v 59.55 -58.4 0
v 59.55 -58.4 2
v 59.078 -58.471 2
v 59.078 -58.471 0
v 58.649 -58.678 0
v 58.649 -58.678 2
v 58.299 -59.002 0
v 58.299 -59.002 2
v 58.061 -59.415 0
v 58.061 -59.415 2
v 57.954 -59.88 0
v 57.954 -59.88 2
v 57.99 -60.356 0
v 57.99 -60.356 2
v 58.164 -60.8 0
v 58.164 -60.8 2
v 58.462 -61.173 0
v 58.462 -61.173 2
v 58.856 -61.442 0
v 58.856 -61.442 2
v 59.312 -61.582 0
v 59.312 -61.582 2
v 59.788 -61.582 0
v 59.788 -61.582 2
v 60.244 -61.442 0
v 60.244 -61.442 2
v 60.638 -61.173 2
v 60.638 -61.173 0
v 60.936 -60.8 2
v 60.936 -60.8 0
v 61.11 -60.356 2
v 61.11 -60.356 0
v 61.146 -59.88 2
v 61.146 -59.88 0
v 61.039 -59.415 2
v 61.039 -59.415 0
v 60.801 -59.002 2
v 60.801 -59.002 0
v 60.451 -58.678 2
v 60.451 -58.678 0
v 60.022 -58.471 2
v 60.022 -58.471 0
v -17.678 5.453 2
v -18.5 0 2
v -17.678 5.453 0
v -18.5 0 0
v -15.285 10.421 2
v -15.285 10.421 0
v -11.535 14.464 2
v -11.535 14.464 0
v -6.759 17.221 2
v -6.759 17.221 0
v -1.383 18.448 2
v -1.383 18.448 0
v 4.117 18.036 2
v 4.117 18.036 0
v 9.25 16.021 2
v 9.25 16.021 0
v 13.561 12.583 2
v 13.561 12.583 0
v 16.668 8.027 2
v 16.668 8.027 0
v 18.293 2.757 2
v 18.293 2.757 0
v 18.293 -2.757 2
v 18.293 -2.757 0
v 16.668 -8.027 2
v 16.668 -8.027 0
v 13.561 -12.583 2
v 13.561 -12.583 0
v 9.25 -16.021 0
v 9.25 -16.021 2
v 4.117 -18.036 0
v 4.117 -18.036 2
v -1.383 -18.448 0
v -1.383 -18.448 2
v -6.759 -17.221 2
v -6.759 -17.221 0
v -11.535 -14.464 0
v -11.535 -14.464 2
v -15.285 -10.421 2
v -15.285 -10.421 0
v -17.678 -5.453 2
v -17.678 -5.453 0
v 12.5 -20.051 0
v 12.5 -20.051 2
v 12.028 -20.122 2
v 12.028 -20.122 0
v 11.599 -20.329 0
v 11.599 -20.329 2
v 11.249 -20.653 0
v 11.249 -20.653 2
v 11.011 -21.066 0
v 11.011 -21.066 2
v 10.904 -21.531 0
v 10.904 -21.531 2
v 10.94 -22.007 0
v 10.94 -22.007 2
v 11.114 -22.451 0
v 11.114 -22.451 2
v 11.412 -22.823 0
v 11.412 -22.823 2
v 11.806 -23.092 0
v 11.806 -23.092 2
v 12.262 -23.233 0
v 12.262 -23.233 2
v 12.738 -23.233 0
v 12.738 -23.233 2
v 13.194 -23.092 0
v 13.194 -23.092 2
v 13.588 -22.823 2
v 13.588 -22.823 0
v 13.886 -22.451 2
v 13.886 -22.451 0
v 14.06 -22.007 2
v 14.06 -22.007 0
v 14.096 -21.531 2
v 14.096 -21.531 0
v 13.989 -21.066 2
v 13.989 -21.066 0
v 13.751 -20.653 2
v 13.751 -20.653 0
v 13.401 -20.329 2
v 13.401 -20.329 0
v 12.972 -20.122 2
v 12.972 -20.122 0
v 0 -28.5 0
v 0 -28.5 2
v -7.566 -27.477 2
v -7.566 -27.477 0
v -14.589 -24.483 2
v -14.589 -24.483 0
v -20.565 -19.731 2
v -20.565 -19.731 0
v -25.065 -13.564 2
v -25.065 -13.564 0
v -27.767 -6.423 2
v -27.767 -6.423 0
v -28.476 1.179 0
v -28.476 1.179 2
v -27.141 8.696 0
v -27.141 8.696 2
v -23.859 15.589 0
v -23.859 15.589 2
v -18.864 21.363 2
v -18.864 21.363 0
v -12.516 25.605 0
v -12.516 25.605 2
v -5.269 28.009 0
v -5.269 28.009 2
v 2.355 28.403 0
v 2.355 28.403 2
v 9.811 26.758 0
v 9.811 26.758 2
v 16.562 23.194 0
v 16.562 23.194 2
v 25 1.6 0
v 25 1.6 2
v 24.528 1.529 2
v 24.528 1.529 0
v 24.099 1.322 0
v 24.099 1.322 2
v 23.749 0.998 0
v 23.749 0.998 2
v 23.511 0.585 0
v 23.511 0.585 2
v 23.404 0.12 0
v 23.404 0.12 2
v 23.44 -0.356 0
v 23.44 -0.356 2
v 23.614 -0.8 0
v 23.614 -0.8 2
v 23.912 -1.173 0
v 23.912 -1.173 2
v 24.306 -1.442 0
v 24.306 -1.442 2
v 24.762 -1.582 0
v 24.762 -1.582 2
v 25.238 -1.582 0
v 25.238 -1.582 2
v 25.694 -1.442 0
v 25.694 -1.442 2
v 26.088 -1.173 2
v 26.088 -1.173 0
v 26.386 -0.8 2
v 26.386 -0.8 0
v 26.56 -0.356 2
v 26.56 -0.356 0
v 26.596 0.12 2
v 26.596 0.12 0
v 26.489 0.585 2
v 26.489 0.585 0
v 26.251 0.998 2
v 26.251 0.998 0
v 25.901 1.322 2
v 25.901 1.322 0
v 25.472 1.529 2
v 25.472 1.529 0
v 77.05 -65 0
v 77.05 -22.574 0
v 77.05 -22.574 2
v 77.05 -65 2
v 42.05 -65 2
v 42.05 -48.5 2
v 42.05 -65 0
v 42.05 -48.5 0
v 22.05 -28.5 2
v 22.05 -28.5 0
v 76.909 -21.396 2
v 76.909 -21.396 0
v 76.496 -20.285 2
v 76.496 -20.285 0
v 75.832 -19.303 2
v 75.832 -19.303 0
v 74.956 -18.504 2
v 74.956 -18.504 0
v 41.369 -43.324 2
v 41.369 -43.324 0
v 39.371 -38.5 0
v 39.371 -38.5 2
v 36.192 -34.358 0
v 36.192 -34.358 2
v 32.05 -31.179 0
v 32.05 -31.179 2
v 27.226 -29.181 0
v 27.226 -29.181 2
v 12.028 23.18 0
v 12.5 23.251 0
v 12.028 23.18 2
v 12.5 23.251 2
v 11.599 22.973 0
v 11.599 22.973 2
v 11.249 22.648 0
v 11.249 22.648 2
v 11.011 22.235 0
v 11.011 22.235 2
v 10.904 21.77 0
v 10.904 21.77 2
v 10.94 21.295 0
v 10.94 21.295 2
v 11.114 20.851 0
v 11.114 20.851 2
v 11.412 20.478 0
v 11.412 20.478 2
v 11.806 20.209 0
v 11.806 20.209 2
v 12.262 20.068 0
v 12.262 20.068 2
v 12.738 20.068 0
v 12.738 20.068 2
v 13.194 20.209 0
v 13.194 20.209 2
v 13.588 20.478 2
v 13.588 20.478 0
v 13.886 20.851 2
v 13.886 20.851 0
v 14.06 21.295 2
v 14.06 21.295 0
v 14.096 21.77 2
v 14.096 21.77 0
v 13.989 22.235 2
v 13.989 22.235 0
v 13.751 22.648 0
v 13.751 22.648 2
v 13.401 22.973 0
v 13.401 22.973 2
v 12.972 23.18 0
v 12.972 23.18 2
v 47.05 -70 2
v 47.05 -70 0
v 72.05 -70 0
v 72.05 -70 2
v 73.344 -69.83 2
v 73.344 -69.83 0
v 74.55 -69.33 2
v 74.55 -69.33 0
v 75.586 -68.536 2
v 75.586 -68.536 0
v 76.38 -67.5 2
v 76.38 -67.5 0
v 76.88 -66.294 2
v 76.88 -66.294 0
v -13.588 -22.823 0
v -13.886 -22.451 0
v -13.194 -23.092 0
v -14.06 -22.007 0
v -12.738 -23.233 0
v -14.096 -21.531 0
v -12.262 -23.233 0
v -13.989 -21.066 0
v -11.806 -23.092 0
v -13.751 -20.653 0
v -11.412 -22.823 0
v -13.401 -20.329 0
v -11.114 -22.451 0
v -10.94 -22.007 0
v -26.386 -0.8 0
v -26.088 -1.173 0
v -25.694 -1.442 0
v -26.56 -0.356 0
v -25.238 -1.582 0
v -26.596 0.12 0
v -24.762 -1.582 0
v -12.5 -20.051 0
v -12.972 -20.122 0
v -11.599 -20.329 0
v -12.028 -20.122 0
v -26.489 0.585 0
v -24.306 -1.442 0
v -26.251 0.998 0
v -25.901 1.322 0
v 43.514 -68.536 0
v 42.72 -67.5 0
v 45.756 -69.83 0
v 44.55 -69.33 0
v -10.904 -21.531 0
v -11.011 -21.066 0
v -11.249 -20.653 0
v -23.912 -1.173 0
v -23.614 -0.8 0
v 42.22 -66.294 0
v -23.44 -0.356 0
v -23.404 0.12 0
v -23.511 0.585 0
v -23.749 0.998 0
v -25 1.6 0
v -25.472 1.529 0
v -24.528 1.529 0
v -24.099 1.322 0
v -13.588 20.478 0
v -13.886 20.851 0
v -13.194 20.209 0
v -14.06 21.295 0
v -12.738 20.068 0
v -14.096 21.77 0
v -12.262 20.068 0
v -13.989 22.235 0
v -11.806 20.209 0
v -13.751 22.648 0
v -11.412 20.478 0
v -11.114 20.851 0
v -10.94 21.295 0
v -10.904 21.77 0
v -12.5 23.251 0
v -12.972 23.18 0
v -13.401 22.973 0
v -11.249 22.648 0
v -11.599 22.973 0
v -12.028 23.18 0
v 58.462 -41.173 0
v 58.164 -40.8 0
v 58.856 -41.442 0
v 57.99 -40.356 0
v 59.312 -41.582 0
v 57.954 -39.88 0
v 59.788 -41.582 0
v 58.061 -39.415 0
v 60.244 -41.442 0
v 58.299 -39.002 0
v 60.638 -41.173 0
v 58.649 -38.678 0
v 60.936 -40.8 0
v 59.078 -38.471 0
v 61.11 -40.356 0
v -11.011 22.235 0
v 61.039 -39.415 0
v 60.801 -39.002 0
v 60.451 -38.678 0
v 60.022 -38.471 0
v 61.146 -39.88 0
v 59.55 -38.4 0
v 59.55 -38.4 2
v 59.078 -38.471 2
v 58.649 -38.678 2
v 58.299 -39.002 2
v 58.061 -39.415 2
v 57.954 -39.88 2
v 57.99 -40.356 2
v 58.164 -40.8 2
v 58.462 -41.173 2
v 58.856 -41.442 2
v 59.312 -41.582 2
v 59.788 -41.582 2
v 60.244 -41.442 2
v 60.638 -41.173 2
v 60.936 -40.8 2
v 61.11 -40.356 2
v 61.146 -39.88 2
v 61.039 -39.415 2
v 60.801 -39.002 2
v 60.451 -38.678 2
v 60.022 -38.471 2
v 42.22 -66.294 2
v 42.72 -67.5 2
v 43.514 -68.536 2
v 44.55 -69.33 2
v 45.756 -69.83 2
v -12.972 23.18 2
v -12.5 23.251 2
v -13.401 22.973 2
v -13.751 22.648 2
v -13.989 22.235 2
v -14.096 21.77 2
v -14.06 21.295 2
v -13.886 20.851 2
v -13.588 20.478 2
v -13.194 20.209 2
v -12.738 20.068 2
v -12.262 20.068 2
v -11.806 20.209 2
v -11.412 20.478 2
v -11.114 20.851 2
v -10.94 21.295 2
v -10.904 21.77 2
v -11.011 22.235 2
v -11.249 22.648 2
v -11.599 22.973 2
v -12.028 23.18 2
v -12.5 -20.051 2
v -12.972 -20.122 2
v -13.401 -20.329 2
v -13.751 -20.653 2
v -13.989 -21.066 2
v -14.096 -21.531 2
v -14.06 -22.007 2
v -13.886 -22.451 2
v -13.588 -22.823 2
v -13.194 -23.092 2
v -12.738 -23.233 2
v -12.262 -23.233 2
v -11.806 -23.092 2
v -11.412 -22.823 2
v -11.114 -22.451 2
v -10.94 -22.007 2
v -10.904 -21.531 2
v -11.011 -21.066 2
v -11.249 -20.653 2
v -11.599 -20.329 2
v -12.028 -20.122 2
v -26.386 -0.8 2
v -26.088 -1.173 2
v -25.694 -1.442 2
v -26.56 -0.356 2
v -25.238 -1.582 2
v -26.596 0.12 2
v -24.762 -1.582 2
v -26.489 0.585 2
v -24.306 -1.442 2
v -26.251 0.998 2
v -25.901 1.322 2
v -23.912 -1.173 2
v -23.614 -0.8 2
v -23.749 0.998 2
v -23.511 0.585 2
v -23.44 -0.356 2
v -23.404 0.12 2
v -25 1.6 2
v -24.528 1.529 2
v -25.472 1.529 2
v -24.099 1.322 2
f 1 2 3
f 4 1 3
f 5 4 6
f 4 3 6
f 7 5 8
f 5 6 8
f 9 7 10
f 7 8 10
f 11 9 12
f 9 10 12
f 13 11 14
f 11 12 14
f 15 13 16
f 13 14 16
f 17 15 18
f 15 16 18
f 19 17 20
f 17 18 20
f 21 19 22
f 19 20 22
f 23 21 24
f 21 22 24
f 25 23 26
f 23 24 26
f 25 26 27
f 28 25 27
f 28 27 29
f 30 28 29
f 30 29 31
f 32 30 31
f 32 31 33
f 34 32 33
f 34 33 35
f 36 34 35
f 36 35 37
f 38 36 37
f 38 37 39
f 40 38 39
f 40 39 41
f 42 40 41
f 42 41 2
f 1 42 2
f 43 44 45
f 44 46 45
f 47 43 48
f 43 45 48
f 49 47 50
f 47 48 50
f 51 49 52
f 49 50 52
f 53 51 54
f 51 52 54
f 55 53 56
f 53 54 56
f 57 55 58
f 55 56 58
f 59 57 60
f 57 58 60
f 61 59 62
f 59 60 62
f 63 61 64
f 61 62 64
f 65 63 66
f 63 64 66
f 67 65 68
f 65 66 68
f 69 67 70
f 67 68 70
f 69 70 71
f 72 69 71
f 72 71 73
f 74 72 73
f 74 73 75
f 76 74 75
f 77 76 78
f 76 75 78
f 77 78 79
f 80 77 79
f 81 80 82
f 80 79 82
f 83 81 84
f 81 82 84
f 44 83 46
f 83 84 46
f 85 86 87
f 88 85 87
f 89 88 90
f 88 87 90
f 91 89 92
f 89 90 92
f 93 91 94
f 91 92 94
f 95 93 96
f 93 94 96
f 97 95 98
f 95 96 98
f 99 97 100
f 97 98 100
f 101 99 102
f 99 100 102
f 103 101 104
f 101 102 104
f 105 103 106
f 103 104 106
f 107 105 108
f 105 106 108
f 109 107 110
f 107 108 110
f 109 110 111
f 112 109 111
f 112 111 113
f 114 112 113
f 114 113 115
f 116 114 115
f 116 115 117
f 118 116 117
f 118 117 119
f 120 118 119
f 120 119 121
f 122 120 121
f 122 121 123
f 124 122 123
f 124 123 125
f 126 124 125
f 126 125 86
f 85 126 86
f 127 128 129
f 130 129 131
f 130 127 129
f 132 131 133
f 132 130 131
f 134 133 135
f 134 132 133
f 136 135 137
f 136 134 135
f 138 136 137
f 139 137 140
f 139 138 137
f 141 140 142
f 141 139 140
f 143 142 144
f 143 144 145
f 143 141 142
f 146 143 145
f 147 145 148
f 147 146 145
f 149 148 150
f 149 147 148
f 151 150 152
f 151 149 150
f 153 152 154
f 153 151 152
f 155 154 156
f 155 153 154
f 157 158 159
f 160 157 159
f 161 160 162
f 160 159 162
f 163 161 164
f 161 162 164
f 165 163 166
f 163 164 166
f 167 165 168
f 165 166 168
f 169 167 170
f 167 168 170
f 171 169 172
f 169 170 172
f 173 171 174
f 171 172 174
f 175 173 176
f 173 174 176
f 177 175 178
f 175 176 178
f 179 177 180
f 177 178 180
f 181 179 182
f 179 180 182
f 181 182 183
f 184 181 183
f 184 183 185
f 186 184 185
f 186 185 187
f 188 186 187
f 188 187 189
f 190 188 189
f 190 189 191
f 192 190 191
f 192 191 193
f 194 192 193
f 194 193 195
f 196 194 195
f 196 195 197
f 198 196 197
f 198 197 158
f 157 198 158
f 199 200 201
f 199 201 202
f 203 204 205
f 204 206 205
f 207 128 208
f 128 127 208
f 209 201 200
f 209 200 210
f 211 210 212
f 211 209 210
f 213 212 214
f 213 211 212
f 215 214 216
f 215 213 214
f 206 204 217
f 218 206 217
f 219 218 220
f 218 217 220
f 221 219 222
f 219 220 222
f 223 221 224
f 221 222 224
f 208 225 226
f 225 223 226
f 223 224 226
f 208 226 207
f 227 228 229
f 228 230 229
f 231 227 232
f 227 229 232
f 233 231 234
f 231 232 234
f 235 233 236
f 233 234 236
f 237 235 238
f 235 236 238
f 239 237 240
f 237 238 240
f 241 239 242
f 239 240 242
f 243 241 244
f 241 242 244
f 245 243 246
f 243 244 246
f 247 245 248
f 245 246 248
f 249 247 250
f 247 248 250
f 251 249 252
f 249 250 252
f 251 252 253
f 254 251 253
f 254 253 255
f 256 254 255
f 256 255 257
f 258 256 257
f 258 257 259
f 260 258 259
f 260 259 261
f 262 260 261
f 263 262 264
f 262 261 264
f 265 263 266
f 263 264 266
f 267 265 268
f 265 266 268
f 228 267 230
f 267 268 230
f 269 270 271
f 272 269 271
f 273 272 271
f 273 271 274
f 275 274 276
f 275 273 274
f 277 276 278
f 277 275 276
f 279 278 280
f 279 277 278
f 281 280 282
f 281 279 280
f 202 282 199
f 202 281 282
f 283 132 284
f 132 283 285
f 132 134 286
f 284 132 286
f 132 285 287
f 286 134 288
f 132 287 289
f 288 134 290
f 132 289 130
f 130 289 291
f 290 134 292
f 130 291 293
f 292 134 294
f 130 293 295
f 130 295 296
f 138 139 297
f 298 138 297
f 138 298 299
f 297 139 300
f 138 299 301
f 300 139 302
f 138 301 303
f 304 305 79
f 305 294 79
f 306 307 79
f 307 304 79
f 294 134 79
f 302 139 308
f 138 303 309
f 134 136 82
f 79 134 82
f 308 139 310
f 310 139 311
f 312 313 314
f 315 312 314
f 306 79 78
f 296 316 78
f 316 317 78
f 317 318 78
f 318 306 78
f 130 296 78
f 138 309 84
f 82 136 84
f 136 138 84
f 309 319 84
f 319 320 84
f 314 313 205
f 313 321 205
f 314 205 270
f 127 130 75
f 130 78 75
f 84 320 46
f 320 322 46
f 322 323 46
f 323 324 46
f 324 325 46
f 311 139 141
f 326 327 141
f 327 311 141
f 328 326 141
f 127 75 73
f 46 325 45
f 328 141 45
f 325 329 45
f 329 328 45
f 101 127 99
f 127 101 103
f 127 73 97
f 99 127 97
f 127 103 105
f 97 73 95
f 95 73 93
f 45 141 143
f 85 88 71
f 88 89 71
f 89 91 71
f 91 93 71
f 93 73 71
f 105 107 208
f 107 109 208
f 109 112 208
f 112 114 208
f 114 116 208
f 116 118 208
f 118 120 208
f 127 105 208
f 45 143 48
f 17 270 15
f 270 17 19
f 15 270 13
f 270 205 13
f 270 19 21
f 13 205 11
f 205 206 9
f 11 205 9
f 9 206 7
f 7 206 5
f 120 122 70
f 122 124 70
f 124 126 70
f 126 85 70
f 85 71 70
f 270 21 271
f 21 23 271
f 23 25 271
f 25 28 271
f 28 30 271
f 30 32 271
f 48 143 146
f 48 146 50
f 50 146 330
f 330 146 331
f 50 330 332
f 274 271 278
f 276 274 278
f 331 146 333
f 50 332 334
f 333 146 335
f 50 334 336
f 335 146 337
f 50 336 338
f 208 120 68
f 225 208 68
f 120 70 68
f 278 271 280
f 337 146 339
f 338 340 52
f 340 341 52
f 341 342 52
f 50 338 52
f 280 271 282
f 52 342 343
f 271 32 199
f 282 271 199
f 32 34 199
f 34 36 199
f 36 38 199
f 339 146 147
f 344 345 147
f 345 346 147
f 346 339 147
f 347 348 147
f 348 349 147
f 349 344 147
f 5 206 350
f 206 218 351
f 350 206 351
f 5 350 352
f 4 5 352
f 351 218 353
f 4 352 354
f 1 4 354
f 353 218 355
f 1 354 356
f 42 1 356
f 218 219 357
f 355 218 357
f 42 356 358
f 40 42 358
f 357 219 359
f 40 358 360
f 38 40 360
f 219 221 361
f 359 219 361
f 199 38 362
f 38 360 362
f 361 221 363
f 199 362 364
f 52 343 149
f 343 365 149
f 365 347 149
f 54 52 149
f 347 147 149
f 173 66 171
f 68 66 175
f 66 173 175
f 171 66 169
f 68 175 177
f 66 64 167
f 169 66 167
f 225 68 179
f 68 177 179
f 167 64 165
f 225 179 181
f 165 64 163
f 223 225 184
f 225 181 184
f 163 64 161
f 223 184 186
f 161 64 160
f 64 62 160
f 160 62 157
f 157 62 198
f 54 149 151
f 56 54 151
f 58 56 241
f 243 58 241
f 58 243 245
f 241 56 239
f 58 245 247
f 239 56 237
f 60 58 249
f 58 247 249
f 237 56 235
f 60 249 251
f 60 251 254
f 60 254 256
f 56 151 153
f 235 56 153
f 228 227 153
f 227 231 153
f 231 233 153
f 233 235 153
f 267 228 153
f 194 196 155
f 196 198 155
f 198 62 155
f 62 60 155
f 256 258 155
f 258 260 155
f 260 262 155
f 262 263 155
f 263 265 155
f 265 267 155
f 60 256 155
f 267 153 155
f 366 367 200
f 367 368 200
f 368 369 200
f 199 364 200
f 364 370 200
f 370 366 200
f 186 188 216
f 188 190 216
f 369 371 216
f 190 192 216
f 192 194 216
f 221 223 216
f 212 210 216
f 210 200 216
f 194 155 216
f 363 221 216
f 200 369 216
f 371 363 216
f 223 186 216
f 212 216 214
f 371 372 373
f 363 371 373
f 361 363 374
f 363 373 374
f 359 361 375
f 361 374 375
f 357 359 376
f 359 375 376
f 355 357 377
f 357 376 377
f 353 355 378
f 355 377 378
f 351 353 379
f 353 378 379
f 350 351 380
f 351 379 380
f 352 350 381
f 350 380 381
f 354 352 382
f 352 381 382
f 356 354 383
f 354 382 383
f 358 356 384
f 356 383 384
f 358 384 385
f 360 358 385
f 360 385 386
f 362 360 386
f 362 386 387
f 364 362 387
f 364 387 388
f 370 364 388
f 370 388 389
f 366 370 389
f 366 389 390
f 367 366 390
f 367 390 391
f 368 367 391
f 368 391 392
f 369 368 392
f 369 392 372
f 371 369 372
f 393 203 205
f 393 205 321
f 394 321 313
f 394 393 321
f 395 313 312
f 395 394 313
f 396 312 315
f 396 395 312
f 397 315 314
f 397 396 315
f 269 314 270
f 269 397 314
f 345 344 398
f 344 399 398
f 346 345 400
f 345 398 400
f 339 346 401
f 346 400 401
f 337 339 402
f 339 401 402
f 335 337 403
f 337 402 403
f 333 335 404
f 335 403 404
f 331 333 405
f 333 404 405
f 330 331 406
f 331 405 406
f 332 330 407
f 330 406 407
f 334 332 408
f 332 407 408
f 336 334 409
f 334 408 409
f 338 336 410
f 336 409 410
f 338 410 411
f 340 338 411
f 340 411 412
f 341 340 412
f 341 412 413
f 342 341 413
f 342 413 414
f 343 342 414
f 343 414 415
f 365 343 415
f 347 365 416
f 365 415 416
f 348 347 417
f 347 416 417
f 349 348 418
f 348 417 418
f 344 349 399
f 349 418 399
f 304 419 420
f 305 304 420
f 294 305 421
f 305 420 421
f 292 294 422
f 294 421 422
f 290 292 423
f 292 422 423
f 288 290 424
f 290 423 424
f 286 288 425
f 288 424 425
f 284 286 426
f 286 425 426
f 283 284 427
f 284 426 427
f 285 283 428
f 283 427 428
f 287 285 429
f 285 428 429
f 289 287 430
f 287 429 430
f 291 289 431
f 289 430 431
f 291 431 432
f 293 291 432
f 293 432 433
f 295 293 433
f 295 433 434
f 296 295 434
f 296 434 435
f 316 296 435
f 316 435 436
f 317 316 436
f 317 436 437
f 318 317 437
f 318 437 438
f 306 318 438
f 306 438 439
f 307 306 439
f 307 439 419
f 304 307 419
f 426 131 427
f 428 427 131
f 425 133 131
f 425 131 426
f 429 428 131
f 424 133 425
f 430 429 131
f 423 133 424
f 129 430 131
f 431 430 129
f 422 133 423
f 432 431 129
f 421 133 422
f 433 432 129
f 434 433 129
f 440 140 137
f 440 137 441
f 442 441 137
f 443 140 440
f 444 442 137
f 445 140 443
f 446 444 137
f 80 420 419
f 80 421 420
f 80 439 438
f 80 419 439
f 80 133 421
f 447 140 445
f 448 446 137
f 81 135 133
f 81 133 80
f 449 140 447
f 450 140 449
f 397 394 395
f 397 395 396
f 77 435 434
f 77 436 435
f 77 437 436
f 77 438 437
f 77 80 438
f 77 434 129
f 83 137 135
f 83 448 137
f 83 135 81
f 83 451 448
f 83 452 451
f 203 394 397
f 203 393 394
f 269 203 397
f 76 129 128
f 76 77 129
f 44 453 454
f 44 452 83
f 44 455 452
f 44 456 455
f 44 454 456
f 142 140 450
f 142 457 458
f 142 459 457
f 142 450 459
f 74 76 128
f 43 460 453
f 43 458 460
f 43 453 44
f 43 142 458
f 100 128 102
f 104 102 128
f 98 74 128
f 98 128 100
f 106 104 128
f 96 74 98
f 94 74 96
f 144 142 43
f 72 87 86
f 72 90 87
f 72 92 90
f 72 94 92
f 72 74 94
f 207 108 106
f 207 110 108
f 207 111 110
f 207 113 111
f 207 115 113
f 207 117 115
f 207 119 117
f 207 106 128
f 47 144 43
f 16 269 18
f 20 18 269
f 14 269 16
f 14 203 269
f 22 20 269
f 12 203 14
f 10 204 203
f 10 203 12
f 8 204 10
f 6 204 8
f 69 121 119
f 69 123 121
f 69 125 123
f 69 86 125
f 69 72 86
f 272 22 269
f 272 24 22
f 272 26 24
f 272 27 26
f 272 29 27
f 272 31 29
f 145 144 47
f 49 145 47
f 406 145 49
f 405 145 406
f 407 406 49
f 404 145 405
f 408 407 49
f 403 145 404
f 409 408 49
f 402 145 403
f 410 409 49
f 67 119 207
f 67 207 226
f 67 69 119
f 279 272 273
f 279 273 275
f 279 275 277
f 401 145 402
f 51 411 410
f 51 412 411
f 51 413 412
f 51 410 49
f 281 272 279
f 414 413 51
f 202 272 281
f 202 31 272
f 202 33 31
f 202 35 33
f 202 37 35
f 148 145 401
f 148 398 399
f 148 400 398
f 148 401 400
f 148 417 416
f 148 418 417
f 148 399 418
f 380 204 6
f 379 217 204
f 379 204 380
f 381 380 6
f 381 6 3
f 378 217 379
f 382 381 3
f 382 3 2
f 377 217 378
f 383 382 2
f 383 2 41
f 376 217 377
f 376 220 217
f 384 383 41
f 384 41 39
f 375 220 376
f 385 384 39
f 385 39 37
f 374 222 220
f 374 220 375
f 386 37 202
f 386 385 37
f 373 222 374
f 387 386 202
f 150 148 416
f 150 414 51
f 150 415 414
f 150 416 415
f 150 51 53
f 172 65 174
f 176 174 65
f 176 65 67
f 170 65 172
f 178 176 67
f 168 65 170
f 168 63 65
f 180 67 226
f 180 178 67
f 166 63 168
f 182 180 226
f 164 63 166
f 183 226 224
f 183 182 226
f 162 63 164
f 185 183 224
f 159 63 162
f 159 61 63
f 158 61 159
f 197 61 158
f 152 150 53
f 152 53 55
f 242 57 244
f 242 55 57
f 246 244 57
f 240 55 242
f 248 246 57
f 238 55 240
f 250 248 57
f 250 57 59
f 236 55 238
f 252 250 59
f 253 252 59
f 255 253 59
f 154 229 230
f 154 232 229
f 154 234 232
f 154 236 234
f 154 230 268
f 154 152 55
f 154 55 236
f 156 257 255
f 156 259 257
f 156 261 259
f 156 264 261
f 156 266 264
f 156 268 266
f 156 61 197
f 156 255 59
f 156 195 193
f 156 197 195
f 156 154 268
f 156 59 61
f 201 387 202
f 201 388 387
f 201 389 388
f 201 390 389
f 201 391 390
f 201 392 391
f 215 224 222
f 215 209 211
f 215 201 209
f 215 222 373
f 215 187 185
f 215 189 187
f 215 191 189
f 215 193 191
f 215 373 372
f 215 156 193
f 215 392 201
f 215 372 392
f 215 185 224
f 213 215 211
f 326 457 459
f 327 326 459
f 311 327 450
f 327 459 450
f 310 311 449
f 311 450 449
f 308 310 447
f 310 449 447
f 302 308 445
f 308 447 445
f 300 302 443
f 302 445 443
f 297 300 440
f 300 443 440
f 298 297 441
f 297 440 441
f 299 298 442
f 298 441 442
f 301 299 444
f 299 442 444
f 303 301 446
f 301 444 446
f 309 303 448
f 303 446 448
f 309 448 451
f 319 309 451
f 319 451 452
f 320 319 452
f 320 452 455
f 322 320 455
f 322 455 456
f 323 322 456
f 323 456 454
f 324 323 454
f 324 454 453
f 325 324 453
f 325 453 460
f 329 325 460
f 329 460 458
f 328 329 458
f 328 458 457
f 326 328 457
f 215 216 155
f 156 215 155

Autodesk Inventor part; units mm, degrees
ref_plane "YZ Plane" through (0, 0, 0) normal (1, 0, 0) x (0, 1, 0)
ref_plane "XZ Plane" through (0, 0, 0) normal (0, 1, 0) x (-1, 0, 0)
ref_plane "XY Plane" through (0, 0, 0) normal (0, 0, 1) x (1, 0, 0)
sketch "スケッチ1" plane through (0, 0, 0) normal (0, 0, 1) x (1, 0, 0)
  circle A0 centre (0, 0) radius 28.5
  line L0 (0, 0) -> (59.55, 0)
  line L1 (59.55, 0) -> (42.05, 0)
  line L2 (42.05, 0) -> (42.05, -70)
  line L3 (42.05, -70) -> (59.55, -70)
  line L4 (59.55, -70) -> (59.55, 0)
  line L5 (77.05, 0) -> (77.05, -70)
  line L6 (77.05, -70) -> (59.55, -70)
  line L7 (77.05, 0) -> (59.55, 0)
  line L8 (42.05, -70) -> (-17.7725, -22.2798)
  line L9 (77.05, -20) -> (42.05, -20)
  line L10 (77.05, -20) -> (16.5623, 23.1936)
  point P0 (42.05, 0)
  point P1 (28.5, 0)
  dimension "d0" = 57
  dimension "d1" = 59.55
  dimension "d2" = 17.5
  dimension "d3" = 70
  dimension "d31" = 50
extrude "押し出し1" add sketch "スケッチ1" along normal blind 2 contours A0 | L0 L2 L8 A0 | A0 L10 L0 | L0 L10 L4 L9 L2 | L2 L9 L4 L3 | L10 L9 L4 | L4 L9 L5 L6
sketch "スケッチ2" plane through (0, 0, 0) normal (0, 0, -1) x (-1, 0, 0)
  circle A0 centre (0, 0) radius 18.5
  dimension "d6" = 37
extrude "押し出し2" cut sketch "スケッチ2" against normal blind 2
sketch "スケッチ3" plane through (0, 0, 0) normal (0, 0, -1) x (-1, 0, 0)
  arc A0 (17.7725, -22.2798) -> (-16.5623, 23.1936) centre (0, 0) ccw projected
  circle A1 centre (0, 0) radius 25
  line L0 (0, 0) -> (0, 28.5)
  line L1 (0, 0) -> (12.5, 21.6506)
  point P0 (-19.257, 34.2013)
  point P1 (12.5, 21.6506)
  point P2 (-12.5, 21.6506)
  point P3 (-25, 0)
  point P4 (-12.5, -21.6506)
  point P5 (12.5, -21.6506)
  point P6 (25, 0)
  point P7 (-39.25, 0)
  dimension "d9" = 50
  dimension "d12" = 360
  dimension "d47" = 30
hole "穴1" at (-12.5, 21.6506, 0) at (12.5, 21.6506, 0) at (25, 0, 0) at (12.5, -21.6506, 0) at (-12.5, -21.6506, 0) at (-25, 0, 0) direction (0, 0, 1) diameter 3.2 end through all
sketch "スケッチ4" plane through (0, 0, 0) normal (0, 0, -1) x (-1, 0, 0)
  line L0 (-77.05, -70) -> (-77.05, -20) projected
  line L1 (17.7725, -22.2798) -> (-42.05, -70) projected
  line L2 (-42.05, -70) -> (-82.05, -70)
  line L3 (-77.05, -20) -> (-42.05, -20)
  line L4 (-42.05, -20) -> (-42.05, -70)
  line L5 (-42.05, -70) -> (-77.05, -70)
  line L6 (-77.05, -70) -> (-77.05, -20)
  line L7 (-59.55, -20) -> (-59.55, -70)
  point P0 (0, 0)
  point P1 (-59.55, -40)
  point P2 (-59.55, -60)
  dimension "d32" = 20
  dimension "d33" = 20
hole "穴2" at (59.55, -40, 0) at (59.55, -60, 0) direction (0, 0, 1) diameter 3.2 end through all
sketch "スケッチ5" plane through (0, 0, 0) normal (0, 0, -1) x (-1, 0, 0)
  arc A0 (17.7725, -22.2798) -> (-16.5623, 23.1936) centre (0, 0) ccw projected
  circle A1 centre (0, 0) radius 28.5
  line L0 (0, -28.5) -> (-42.05, -28.5)
  line L1 (17.7725, -22.2798) -> (-42.05, -70) projected
  line L2 (-42.05, -28.5) -> (-42.05, -70)
  point P0 (17.7725, -22.2798)
  point P1 (-2.7683, -39.25)
  point P2 (-16.5623, 23.1936)
  point P3 (17.7725, -22.2798)
  dimension "d35" = 57
extrude "押し出し3" cut sketch "スケッチ5" against normal blind 2 contours L1 L2 L0 A1
fillet "フィレット2" radius 20 1 edges at (42.05, -28.5, 1)
fillet "フィレット3" radius 5 3 edges at (42.05, -70, 1) (77.05, -70, 1) (77.05, -20, 1)
sketch "スケッチ6" plane through (0, 0, 0) normal (0, 0, -1) x (-1, 0, 0)
  circle A0 centre (12.5, 21.6506) radius 1.6 projected
  circle A1 centre (12.5, 21.6506) radius 3
  circle A2 centre (-12.5, 21.6506) radius 3
  circle A3 centre (-25, 0) radius 3
  circle A4 centre (-12.5, -21.6506) radius 3
  circle A5 centre (12.5, -21.6506) radius 3
  circle A6 centre (25, 0) radius 3
  point P0 (0, 0)
  dimension "d40" = 6
  dimension "d43" = 360
extrude "押し出し4" [suppressed]
equation "\"d1\" = Sside"
equation "\"BendRadius\" = Thickness"
equation "\"BendReliefWidth\" = Thickness"
equation "\"BendReliefDepth\" = 0.5 * Thickness"
equation "\"CornerReliefSize\" = 4 * Thickness"
equation "\"MinimumRemnant\" = 2 * Thickness"
equation "\"TransitionRadius\" = BendRadius"
equation "\"JacobiRadiusSize\" = BendRadius"
equation "\"GapSize\" = Thickness"
equation "\"Sside\" = 59.55"
equation "\"Thickness\" = 3.048"
properties part number "upperarm_fixplate1_forR0" material "アルミニウム 6061"
